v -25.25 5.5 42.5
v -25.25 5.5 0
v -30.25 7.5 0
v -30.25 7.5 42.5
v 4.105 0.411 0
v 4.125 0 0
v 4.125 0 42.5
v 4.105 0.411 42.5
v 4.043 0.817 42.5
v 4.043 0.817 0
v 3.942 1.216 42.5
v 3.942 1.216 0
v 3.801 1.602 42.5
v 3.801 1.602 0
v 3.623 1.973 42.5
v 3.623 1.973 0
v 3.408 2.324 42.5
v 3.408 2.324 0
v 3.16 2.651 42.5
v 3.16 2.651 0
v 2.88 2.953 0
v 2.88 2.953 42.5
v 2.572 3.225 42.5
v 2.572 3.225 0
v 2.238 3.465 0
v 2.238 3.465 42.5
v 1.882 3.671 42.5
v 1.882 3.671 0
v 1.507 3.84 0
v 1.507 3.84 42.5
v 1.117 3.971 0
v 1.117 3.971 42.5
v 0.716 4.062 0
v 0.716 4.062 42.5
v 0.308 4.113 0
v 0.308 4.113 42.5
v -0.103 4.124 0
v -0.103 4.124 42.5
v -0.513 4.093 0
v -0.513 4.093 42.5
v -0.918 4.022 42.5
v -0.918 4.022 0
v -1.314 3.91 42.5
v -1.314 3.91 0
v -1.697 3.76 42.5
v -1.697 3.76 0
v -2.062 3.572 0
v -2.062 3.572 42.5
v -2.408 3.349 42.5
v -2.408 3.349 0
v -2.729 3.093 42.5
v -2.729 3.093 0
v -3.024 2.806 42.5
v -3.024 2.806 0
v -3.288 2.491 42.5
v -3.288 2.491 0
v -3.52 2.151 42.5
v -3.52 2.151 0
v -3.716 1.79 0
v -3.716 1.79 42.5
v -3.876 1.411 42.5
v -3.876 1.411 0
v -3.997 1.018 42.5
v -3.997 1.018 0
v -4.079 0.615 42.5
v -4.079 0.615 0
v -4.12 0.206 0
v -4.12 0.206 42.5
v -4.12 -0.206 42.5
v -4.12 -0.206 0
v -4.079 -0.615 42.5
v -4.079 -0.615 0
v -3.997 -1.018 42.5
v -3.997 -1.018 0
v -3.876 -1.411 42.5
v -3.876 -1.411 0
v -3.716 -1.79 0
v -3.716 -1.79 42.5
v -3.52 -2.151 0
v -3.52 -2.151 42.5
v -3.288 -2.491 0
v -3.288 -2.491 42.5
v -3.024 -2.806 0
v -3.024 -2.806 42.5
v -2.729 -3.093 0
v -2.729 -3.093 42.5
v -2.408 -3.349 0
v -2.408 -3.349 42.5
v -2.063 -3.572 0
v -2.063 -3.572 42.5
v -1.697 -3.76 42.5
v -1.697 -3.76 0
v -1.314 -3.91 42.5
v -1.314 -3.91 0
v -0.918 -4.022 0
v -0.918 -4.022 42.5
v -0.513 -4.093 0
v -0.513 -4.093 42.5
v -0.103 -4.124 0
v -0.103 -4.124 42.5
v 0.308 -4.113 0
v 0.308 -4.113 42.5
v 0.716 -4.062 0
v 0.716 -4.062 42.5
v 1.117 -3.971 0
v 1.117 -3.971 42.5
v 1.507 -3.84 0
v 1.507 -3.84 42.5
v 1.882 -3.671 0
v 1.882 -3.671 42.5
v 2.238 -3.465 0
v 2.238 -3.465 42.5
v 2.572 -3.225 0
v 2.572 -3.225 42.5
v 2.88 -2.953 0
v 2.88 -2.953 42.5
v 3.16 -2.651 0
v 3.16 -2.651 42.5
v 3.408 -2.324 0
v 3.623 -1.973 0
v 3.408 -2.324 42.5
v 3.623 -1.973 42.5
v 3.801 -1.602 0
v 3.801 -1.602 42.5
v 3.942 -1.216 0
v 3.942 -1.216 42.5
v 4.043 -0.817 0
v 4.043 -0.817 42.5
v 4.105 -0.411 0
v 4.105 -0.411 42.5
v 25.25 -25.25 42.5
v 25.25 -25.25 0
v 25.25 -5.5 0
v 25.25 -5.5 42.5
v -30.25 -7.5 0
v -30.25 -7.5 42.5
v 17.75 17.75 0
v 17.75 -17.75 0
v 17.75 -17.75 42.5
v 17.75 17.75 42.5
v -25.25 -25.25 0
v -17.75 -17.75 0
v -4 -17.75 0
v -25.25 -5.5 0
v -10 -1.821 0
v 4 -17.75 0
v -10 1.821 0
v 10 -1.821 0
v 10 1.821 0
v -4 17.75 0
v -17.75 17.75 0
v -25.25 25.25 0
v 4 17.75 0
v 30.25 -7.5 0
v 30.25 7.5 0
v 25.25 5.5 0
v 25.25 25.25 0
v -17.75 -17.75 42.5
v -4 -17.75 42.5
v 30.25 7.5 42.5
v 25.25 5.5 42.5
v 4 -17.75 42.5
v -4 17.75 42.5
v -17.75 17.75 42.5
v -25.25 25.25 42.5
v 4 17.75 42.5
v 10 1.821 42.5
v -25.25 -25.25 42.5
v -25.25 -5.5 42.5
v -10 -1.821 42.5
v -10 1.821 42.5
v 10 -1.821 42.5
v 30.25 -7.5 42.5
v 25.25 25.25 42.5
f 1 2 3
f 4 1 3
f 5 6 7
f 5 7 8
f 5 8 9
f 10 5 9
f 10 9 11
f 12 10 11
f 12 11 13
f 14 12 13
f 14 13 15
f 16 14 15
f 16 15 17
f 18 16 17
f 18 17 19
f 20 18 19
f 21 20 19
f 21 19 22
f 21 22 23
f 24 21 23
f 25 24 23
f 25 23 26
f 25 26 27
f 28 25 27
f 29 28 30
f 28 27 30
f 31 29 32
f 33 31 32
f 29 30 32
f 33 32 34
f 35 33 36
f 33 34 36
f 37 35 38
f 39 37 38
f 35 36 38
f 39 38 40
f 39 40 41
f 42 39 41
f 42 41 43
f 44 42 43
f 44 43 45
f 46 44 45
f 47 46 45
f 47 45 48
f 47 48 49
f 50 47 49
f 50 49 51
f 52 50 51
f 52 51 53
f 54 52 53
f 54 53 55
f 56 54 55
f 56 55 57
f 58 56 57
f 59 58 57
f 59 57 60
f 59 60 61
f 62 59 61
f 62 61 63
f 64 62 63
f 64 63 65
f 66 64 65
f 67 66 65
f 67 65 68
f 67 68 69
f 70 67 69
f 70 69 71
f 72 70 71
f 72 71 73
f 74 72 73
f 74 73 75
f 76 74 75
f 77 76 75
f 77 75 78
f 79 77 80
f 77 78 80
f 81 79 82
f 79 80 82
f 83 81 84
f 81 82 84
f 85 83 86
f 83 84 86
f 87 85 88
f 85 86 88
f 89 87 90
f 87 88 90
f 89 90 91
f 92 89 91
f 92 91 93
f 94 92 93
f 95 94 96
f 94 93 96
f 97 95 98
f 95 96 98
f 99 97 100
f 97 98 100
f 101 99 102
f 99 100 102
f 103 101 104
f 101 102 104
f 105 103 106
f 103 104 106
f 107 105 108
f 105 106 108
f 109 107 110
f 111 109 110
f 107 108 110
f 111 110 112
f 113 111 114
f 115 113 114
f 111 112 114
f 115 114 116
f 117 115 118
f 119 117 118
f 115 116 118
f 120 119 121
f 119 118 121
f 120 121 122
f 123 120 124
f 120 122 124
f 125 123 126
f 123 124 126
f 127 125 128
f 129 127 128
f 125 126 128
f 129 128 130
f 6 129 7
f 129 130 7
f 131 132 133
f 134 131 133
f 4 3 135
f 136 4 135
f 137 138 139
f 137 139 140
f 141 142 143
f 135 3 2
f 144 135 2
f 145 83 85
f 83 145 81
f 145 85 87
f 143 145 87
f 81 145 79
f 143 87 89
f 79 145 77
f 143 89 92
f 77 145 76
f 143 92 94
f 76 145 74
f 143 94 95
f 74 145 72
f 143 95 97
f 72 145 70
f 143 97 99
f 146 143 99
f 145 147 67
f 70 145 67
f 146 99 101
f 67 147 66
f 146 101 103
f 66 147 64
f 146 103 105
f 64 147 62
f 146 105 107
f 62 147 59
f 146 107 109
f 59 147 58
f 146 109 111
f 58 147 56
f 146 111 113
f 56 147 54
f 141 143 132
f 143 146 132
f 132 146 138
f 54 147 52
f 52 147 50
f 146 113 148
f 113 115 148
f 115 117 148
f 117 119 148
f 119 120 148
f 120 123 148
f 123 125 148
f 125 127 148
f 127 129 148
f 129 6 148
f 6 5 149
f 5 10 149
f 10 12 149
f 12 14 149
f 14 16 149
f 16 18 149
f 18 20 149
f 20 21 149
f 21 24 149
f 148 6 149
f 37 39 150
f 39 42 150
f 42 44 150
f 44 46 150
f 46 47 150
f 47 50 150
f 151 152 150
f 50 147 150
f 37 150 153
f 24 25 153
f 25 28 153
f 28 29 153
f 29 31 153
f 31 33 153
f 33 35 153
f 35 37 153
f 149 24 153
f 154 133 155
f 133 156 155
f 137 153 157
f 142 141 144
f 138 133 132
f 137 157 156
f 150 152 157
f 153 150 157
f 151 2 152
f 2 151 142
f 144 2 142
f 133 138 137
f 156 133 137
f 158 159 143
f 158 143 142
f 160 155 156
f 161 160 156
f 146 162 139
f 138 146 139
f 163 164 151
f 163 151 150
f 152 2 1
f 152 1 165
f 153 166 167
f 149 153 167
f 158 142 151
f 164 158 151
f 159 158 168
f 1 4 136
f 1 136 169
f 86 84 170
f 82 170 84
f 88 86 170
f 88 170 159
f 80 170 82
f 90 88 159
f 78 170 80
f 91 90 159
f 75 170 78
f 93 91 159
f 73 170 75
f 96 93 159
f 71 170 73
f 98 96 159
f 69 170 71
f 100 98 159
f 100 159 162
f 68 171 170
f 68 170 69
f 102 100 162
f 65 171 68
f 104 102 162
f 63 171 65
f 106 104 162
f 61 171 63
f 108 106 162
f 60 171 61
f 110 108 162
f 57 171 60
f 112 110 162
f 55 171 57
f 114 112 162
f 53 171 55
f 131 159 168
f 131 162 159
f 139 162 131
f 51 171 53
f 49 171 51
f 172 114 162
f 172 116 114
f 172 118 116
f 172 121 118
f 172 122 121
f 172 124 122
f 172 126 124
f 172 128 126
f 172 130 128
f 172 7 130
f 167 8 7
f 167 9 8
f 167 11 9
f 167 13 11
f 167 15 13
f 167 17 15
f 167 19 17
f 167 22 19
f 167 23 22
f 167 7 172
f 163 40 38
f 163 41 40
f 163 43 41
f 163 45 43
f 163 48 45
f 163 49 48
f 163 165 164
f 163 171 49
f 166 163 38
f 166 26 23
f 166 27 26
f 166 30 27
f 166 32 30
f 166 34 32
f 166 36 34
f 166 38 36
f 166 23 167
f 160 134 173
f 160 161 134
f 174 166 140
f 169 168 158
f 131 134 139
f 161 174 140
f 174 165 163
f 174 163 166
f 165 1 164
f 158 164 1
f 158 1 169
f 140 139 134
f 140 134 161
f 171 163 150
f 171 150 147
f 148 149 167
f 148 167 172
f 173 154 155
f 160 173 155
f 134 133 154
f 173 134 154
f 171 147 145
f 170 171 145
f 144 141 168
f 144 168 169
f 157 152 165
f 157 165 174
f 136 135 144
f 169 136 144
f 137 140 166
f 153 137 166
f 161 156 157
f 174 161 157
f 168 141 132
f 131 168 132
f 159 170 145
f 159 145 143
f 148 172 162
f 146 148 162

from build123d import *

# Parameters (mm, degrees)
SKETCH1_W           = 50.5
SKETCH1_H           = 50.5
BOSS_EXTRUDE1_DEPTH = 42.5
SKETCH2_R           = 4.125
CUT_EXTRUDE1_DEPTH  = 46.2
CUT_EXTRUDE2_DEPTH  = 76


with BuildPart() as part:
    # Sketch1 → Boss-Extrude1 (new body)
    with BuildSketch(Plane.XY):
        Rectangle(SKETCH1_W, SKETCH1_H)
        Polygon((-25.25, -5.5), (-25.25, 5.5), (-30.25, 7.5), (-30.25, -7.5), align=None)
        Polygon((30.25, 7.5), (25.25, 5.5), (25.25, -5.5), (30.25, -7.5), align=None)
    extrude(amount=BOSS_EXTRUDE1_DEPTH)

    # Sketch2 → Cut-Extrude1 (cut)
    with BuildSketch(Plane.XY.offset(42.5)):
        Circle(SKETCH2_R)
    extrude(amount=-CUT_EXTRUDE1_DEPTH, mode=Mode.SUBTRACT)

    # Sketch4 → Cut-Extrude2 (cut)
    with BuildSketch(Plane.XY.offset(42.5)):
        Polygon((-17.75, -17.75), (-17.75, 17.75), (-4, 17.75), (-10, 1.820899919), (-10, -1.820899919), (-4, -17.75), align=None)
        Polygon((10, -1.820899919), (4, -17.75), (17.75, -17.75), (17.75, 17.75), (4, 17.75), (10, 1.820899919), align=None)
    extrude(amount=-CUT_EXTRUDE2_DEPTH, mode=Mode.SUBTRACT)


solid = part.part
